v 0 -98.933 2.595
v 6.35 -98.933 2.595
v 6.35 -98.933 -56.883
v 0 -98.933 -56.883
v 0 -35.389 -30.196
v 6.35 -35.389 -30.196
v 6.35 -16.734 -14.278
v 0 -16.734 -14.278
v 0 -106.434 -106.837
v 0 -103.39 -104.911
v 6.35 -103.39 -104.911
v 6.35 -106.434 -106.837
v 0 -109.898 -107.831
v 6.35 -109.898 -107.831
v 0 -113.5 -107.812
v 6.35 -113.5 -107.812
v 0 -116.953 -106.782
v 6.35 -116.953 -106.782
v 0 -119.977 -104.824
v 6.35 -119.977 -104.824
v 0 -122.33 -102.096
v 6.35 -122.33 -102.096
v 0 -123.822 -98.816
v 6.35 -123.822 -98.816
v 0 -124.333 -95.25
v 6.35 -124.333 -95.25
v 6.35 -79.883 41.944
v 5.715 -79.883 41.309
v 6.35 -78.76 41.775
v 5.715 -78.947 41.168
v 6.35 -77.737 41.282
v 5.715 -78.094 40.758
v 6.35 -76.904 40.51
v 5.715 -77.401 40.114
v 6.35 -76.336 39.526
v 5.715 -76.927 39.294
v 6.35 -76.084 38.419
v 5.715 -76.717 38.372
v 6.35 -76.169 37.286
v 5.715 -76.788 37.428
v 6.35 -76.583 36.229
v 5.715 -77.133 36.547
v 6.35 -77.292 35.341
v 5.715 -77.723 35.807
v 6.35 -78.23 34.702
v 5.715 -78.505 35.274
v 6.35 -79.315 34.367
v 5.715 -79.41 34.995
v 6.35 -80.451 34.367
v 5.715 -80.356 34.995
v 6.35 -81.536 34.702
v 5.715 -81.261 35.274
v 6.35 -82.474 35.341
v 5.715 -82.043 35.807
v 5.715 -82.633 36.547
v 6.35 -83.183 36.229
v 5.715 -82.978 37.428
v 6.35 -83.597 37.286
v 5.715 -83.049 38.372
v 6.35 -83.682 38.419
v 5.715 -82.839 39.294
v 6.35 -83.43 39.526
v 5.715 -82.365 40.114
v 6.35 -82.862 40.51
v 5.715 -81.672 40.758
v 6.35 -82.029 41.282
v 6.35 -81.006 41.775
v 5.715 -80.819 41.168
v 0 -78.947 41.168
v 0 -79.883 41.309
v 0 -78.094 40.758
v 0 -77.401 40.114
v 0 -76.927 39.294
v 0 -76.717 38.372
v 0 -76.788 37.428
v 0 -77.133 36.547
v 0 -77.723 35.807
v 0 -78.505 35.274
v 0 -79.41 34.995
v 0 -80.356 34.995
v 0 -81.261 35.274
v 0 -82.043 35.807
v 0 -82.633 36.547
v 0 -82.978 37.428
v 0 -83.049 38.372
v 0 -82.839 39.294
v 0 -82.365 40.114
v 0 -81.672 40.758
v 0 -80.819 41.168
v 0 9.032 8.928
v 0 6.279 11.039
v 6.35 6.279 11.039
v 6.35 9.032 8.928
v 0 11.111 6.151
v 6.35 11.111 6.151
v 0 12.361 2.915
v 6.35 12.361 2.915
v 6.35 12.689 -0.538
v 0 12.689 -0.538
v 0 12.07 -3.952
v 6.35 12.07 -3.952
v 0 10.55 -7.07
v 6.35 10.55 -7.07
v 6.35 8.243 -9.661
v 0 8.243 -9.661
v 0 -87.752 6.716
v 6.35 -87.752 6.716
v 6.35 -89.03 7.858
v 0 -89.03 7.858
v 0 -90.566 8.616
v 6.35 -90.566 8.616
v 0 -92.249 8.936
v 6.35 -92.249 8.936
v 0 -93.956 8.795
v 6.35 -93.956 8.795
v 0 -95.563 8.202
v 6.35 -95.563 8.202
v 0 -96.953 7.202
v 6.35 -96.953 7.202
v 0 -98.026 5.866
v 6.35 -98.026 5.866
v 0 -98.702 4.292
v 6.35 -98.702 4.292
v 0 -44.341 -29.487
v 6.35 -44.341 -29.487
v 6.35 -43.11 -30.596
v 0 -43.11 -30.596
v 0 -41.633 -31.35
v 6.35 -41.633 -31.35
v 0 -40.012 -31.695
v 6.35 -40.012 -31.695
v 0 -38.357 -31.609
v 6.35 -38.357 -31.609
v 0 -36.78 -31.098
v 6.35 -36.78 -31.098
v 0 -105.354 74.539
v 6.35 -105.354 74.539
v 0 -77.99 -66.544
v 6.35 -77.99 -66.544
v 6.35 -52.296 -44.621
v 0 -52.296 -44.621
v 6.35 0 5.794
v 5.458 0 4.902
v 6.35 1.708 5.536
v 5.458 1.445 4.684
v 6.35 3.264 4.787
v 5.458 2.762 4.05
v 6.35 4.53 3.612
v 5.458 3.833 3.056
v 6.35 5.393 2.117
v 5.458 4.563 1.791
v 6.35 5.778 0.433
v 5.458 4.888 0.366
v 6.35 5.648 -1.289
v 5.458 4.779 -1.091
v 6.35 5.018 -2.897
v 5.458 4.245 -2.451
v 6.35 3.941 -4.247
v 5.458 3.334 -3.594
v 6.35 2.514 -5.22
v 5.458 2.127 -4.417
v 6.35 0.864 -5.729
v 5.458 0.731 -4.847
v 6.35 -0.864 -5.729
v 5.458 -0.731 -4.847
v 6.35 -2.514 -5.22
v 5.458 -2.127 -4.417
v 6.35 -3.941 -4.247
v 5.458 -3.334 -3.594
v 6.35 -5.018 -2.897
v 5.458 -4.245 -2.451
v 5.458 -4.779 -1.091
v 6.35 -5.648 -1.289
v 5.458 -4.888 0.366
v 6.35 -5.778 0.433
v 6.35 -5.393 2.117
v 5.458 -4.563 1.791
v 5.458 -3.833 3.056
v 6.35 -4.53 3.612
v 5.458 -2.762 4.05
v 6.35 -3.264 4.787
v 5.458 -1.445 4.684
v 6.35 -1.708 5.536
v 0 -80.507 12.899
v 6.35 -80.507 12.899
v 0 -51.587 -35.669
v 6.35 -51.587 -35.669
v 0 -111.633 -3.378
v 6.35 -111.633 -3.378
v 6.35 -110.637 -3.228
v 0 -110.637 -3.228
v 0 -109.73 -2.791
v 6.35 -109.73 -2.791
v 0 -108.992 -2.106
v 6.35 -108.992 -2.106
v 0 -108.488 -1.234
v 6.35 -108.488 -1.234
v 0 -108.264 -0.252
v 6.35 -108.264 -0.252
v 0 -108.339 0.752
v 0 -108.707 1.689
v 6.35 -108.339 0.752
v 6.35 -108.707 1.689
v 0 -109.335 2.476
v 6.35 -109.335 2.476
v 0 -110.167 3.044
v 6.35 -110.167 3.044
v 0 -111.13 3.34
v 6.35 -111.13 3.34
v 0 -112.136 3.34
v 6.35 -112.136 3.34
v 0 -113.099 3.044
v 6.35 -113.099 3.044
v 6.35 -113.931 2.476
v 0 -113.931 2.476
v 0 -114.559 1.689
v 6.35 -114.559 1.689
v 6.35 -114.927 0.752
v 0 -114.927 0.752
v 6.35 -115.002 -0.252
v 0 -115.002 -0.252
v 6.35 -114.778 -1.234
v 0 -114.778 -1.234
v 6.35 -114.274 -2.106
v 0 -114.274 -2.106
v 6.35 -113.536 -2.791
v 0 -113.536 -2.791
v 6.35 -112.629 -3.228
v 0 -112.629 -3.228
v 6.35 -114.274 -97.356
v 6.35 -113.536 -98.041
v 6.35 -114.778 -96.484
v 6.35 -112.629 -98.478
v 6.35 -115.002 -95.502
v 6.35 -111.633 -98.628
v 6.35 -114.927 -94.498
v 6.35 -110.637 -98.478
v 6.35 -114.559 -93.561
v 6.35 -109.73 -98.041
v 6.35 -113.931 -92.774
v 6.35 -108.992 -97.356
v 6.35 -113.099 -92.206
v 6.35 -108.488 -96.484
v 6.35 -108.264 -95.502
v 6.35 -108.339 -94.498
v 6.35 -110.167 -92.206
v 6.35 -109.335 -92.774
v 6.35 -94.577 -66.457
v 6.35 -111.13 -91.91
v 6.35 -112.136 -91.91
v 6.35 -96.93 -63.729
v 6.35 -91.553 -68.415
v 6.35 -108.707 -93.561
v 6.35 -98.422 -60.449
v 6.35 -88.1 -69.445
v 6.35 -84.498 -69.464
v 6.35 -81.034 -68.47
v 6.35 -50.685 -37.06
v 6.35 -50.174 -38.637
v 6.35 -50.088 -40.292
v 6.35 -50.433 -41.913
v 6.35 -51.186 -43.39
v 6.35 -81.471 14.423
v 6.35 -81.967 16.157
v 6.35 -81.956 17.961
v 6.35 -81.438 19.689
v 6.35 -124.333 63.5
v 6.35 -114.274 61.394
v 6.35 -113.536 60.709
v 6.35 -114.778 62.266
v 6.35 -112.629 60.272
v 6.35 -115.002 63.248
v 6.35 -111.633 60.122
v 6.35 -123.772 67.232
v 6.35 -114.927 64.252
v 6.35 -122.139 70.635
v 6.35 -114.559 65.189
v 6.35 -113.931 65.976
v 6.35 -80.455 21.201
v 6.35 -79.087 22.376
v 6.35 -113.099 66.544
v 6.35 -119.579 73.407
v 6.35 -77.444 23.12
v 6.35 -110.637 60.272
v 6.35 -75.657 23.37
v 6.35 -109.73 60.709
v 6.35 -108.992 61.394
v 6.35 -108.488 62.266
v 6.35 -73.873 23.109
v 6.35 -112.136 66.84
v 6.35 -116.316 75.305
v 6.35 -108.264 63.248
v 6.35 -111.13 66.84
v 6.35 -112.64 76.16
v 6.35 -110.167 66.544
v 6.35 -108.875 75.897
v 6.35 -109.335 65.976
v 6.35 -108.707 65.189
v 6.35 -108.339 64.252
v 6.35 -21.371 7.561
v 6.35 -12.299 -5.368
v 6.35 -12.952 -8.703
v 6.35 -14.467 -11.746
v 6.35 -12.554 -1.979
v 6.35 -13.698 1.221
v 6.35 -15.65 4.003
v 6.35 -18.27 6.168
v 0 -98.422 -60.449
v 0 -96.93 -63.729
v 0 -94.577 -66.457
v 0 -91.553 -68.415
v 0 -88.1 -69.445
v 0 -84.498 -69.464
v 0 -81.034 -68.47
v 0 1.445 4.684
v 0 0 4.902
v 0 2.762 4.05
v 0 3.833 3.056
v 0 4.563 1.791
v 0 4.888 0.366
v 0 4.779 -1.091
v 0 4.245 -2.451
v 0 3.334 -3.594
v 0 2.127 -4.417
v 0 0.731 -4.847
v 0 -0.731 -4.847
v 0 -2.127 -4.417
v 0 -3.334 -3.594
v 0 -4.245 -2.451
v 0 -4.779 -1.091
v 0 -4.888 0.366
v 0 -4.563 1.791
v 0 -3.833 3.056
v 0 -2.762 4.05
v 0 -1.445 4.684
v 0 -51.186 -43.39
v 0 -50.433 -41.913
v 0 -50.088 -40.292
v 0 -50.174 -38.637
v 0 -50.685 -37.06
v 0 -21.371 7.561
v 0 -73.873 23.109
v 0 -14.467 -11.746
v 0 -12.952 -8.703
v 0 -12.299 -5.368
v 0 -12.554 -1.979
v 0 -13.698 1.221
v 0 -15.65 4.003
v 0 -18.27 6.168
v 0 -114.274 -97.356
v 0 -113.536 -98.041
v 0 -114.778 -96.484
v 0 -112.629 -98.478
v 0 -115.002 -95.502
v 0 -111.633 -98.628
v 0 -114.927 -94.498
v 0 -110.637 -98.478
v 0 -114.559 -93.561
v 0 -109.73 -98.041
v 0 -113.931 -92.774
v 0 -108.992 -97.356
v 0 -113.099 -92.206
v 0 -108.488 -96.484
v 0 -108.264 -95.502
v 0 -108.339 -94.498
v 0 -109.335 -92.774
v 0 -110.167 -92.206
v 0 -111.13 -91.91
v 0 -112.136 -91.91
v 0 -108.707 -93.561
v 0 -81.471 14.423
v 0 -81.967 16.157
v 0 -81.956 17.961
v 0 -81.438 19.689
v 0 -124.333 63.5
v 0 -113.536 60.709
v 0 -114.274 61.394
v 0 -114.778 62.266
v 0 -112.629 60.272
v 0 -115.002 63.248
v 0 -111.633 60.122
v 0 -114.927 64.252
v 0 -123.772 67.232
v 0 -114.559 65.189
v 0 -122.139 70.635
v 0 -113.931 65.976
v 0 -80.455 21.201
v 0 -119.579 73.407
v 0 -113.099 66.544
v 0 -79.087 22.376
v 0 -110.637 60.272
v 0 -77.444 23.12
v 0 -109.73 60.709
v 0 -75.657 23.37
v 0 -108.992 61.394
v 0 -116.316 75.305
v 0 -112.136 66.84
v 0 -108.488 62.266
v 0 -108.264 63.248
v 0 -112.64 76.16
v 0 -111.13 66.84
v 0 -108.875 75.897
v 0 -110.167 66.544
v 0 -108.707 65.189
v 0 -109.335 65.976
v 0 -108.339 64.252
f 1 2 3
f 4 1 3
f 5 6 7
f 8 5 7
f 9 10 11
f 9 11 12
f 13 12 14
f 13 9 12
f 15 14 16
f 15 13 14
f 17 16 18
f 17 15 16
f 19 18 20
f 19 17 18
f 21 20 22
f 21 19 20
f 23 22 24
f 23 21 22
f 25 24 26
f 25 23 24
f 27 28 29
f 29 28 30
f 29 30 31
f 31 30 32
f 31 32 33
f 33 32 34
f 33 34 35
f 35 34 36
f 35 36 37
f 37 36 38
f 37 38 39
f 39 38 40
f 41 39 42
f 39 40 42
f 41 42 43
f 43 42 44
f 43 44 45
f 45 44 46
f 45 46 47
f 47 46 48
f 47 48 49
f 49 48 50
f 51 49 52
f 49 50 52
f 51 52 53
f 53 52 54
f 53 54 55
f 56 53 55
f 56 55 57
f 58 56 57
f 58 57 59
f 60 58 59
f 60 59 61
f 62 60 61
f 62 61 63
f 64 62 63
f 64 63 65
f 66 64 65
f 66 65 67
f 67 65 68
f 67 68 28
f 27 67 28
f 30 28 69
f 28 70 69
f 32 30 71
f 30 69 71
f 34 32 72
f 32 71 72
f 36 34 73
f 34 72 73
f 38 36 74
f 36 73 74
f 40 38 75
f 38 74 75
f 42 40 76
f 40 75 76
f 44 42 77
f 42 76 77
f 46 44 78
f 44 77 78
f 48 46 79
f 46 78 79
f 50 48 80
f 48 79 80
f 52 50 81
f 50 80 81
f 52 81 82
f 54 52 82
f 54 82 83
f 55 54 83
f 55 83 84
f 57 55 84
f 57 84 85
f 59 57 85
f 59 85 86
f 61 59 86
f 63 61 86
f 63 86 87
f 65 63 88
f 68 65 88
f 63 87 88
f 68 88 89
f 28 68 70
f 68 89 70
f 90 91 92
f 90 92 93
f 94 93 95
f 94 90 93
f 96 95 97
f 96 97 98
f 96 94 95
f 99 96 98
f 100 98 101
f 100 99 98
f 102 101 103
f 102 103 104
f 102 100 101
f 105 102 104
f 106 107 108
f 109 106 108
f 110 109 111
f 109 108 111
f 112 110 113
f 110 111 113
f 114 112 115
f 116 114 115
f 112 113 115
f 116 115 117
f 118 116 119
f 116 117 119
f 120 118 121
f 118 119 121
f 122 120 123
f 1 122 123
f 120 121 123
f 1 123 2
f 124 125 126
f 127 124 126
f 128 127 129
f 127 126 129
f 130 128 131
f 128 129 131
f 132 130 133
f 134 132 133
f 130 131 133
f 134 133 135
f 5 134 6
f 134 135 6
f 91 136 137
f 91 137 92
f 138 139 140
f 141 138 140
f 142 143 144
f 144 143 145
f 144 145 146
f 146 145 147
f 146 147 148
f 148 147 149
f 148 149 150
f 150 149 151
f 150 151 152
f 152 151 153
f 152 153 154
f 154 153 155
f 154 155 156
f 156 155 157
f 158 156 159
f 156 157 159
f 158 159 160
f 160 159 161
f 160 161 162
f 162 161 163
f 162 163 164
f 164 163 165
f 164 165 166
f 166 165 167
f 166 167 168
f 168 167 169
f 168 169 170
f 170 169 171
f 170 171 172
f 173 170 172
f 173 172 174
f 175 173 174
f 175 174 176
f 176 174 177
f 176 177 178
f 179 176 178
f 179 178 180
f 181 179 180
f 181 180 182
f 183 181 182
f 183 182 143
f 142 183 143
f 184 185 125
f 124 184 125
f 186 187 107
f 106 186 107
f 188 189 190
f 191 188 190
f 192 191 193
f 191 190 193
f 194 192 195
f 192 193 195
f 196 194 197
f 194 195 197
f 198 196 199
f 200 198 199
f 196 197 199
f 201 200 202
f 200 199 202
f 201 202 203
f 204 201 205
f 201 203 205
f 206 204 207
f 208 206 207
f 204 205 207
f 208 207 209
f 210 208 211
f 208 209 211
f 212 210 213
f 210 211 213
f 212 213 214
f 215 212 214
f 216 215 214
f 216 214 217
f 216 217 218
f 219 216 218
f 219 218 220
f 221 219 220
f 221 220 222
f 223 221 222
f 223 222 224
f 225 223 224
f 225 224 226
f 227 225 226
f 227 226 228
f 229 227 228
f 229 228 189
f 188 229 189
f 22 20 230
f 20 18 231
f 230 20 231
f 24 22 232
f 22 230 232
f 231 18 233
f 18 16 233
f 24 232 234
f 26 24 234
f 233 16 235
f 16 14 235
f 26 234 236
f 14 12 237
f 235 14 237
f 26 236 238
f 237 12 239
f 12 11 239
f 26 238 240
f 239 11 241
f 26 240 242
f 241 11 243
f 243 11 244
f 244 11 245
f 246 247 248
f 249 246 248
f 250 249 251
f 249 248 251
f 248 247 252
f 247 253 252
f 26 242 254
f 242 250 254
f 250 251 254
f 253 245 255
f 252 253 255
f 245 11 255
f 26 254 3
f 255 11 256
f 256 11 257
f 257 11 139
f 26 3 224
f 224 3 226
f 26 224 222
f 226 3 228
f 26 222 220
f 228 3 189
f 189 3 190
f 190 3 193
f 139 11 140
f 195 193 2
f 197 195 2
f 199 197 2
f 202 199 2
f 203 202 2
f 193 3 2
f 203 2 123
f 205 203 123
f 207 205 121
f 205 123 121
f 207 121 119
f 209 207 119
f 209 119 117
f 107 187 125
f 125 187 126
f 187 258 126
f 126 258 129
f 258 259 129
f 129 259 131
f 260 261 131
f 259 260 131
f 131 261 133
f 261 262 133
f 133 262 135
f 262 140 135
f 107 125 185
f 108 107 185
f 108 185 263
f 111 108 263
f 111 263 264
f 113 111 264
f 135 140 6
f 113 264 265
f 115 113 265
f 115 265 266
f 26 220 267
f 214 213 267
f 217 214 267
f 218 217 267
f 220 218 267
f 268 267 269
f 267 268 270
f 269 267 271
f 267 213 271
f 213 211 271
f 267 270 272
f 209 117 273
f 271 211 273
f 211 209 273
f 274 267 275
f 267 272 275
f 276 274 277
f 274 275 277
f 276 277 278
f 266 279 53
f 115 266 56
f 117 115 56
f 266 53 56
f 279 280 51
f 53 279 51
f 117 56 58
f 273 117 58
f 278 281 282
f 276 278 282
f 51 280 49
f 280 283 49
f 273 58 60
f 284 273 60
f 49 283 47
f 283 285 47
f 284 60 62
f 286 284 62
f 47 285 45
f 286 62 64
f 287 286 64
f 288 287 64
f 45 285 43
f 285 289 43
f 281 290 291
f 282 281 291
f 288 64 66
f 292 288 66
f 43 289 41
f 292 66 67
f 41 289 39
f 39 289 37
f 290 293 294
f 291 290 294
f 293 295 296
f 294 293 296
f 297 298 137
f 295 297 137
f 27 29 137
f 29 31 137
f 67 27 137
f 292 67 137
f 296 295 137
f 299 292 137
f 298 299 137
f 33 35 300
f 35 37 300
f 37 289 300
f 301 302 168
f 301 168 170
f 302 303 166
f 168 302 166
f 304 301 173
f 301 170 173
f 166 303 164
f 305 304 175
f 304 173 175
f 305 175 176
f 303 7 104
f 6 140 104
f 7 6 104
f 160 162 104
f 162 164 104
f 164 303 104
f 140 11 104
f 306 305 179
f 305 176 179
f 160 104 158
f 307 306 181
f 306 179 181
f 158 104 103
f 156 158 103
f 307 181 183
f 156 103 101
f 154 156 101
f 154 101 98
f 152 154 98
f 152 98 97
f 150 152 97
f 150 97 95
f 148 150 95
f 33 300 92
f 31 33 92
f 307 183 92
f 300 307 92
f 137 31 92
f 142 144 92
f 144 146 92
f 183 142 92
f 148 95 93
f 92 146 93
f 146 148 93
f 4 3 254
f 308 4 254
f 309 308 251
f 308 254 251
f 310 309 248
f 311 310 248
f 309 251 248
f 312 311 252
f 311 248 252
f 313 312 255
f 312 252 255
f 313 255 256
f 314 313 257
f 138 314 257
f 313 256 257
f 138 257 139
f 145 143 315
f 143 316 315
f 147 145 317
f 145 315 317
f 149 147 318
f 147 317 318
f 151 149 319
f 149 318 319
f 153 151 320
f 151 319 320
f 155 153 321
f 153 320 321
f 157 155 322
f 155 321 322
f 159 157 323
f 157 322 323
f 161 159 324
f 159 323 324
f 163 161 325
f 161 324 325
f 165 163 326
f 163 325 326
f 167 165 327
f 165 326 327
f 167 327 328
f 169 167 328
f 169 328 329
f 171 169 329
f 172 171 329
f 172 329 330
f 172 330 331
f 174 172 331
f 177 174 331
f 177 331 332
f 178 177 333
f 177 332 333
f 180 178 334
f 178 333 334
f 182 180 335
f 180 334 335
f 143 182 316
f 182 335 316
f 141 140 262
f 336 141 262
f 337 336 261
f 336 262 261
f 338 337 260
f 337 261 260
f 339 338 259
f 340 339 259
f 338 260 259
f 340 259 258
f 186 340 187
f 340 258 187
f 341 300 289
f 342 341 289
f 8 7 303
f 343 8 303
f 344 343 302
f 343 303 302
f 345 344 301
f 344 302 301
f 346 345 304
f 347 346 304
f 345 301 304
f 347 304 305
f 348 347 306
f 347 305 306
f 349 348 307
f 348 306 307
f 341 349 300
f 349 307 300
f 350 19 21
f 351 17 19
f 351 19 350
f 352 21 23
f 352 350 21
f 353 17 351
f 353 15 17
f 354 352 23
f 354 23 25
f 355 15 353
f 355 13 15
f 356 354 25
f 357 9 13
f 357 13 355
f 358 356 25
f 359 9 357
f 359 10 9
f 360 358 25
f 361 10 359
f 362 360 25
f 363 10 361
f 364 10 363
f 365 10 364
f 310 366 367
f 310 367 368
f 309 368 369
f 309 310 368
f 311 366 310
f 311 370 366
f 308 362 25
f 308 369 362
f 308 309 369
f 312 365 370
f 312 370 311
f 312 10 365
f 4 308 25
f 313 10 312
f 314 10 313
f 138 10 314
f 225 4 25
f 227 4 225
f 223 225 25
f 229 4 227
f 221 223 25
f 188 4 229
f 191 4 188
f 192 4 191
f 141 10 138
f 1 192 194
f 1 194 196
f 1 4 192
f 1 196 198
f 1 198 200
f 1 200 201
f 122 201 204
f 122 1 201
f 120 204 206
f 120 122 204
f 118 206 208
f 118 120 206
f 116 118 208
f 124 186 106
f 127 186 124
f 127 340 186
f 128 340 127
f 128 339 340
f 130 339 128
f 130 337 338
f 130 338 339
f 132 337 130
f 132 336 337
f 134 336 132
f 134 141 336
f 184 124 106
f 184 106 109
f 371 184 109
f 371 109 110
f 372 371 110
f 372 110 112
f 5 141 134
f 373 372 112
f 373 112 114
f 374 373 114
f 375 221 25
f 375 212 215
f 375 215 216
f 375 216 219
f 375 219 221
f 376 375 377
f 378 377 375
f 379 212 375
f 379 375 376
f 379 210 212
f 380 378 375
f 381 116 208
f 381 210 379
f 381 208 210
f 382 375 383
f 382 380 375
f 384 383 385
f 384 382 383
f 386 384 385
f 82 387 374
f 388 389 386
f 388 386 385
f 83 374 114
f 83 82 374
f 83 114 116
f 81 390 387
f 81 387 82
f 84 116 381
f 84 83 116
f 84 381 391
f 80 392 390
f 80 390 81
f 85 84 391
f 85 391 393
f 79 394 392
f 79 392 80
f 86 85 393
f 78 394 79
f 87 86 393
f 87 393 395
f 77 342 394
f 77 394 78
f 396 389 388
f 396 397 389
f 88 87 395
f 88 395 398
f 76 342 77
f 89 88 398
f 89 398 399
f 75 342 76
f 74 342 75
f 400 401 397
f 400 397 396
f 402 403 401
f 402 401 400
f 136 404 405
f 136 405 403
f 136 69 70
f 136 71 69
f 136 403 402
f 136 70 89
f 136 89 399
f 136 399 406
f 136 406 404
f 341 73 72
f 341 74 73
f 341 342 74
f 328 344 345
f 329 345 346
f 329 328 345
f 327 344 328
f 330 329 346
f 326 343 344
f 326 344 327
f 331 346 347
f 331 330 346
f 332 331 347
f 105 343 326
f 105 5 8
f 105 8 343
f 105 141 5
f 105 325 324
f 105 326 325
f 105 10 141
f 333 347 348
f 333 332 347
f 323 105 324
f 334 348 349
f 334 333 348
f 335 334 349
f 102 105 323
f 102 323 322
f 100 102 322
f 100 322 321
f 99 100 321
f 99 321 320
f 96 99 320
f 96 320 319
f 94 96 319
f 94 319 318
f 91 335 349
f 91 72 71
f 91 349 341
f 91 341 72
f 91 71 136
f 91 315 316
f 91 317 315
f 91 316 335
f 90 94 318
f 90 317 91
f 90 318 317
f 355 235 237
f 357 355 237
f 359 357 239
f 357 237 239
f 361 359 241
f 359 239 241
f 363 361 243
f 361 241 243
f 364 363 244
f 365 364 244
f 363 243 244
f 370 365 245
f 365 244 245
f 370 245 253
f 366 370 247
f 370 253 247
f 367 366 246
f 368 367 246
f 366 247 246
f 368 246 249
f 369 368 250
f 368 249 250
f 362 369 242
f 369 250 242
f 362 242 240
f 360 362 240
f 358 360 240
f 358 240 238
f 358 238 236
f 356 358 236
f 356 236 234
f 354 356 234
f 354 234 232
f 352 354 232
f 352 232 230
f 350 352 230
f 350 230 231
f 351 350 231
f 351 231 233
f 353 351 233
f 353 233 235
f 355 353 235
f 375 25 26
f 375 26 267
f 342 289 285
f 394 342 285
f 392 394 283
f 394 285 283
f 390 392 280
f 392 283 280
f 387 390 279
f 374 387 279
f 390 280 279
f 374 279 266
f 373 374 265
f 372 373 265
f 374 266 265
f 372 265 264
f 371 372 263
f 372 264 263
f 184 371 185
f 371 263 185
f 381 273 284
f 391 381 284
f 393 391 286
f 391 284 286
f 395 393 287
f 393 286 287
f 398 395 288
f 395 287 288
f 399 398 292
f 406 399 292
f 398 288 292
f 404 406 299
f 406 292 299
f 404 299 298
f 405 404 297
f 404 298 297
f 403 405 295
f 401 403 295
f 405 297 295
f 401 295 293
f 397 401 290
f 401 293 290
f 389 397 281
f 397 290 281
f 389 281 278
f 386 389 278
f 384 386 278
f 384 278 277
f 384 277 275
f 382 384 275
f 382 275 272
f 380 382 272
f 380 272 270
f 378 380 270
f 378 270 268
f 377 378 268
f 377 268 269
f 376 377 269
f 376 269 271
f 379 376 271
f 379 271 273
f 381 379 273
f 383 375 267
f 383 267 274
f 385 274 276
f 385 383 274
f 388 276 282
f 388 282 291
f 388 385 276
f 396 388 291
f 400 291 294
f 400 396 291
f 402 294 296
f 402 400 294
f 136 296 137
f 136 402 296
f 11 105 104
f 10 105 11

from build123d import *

# Parameters (mm, degrees)
BOSS_EXTRUDE1_DEPTH                  = 6.35
CUT_EXTRUDE1_REACH                   = 8.35
SKETCH2_R                            = 3.3782
F_3_8_CLEARANCE_HOLE1_D              = 9.8044
F_3_8_CLEARANCE_HOLE1_CSINK_D        = 11.58748
F_3_8_CLEARANCE_HOLE1_CSINK_ANGLE    = 90
F_1_4_0_2500_DOWEL_HOLE1_D           = 6.35
F_1_4_0_2500_DOWEL_HOLE1_CSINK_D     = 7.62
F_1_4_0_2500_DOWEL_HOLE1_CSINK_ANGLE = 90
CUT_EXTRUDE2_DEPTH                   = 7.35


with BuildPart() as part:
    # Sketch1 → Boss-Extrude1 (new body)
    with BuildSketch(Plane(origin=(0, 0, 0), x_dir=(0, 0, -1), z_dir=(1, 0, 0))):
        with BuildLine():
            Line((-74.539032088, -105.353687095), (-11.039032088, 6.279312905))
            ThreePointArc((-11.039032088, 6.279312905), (-1.199563995, 12.643221355), (9.661154553, 8.243305933))
            Line((9.661154553, 8.243305933), (104.911154553, -103.389694067))
            ThreePointArc((104.911154553, -103.389694067), (106.782128714, -116.95277512), (95.25, -124.333))
            Line((95.25, -124.333), (-63.5, -124.333))
            ThreePointArc((-63.5, -124.333), (-74.478098057, -118.018245731), (-74.539032088, -105.353687095))
        make_face()
    extrude(amount=BOSS_EXTRUDE1_DEPTH)

    # Sketch2 → Cut-Extrude1 (cut, up to next)
    with BuildSketch(Plane(origin=(6.35, 0, 0), x_dir=(0, 0, -1), z_dir=(1, 0, 0)), mode=Mode.PRIVATE) as cut_extrude1_sk1:
        with Locations((-63.5, -111.633)):
            Circle(SKETCH2_R)
    cut_extrude1_tool1 = extrude(cut_extrude1_sk1.sketch, amount=-CUT_EXTRUDE1_REACH, mode=Mode.PRIVATE) & part.part
    add(cut_extrude1_tool1.solids().sort_by_distance((6.35, -111.633, 63.5))[0], mode=Mode.SUBTRACT)
    # Sketch2 → Cut-Extrude1 (cut, up to next)
    with BuildSketch(Plane(origin=(6.35, 0, 0), x_dir=(0, 0, -1), z_dir=(1, 0, 0)), mode=Mode.PRIVATE) as cut_extrude1_sk2:
        with Locations((0, -111.633)):
            Circle(SKETCH2_R)
    cut_extrude1_tool2 = extrude(cut_extrude1_sk2.sketch, amount=-CUT_EXTRUDE1_REACH, mode=Mode.PRIVATE) & part.part
    add(cut_extrude1_tool2.solids().sort_by_distance((6.35, -111.633, 0))[0], mode=Mode.SUBTRACT)
    # Sketch2 → Cut-Extrude1 (cut, up to next)
    with BuildSketch(Plane(origin=(6.35, 0, 0), x_dir=(0, 0, -1), z_dir=(1, 0, 0)), mode=Mode.PRIVATE) as cut_extrude1_sk3:
        with Locations((95.25, -111.633)):
            Circle(SKETCH2_R)
    cut_extrude1_tool3 = extrude(cut_extrude1_sk3.sketch, amount=-CUT_EXTRUDE1_REACH, mode=Mode.PRIVATE) & part.part
    add(cut_extrude1_tool3.solids().sort_by_distance((6.35, -111.633, -95.25))[0], mode=Mode.SUBTRACT)

    # 3/8 Clearance Hole1 (through all)
    with Locations(Plane(origin=(6.35, 0, 0), x_dir=(0, 0, -1), z_dir=(1, 0, 0))):
        with Locations((0, 0)):
            CounterSinkHole(F_3_8_CLEARANCE_HOLE1_D / 2, F_3_8_CLEARANCE_HOLE1_CSINK_D / 2, counter_sink_angle=F_3_8_CLEARANCE_HOLE1_CSINK_ANGLE)

    # 1/4 (0.2500) Dowel Hole1 (through all)
    with Locations(Plane(origin=(6.35, 0, 0), x_dir=(0, 0, -1), z_dir=(1, 0, 0))):
        with Locations((-38.134262993, -79.883)):
            CounterSinkHole(F_1_4_0_2500_DOWEL_HOLE1_D / 2, F_1_4_0_2500_DOWEL_HOLE1_CSINK_D / 2, counter_sink_angle=F_1_4_0_2500_DOWEL_HOLE1_CSINK_ANGLE)

    # Sketch7 → Cut-Extrude2 (cut, through all)
    with BuildSketch(Plane(origin=(6.35, 0, 0), x_dir=(0, 0, -1), z_dir=(1, 0, 0))):
        with BuildLine():
            Line((-7.560548241, -21.370623035), (-23.109121722, -73.87283281))
            ThreePointArc((-23.109121722, -73.87283281), (-20.480108275, -81.000798522), (-12.898859563, -80.506556809))
            Line((-12.898859563, -80.506556809), (29.486651444, -44.341445027))
            ThreePointArc((29.486651444, -44.341445027), (31.69518119, -40.012152938), (30.195575755, -35.389214784))
            Line((30.195575755, -35.389214784), (14.277824698, -16.733610546))
            ThreePointArc((14.277824698, -16.733610546), (1.978846134, -12.553878022), (-7.560548241, -21.370623035))
        make_face()
        with BuildLine():
            Line((-2.594727147, -98.933), (56.882953013, -98.933))
            ThreePointArc((56.882953013, -98.933), (68.415081727, -91.55277512), (66.544107566, -77.989694067))
            Line((66.544107566, -77.989694067), (44.621361137, -52.296235252))
            ThreePointArc((44.621361137, -52.296235252), (40.292069047, -50.087705507), (35.669130894, -51.587310942))
            Line((35.669130894, -51.587310942), (-6.716380114, -87.752422723))
            ThreePointArc((-6.716380114, -87.752422723), (-8.552774886, -94.779398677), (-2.594727147, -98.933))
        make_face()
    extrude(amount=-CUT_EXTRUDE2_DEPTH, mode=Mode.SUBTRACT)


solid = part.part
